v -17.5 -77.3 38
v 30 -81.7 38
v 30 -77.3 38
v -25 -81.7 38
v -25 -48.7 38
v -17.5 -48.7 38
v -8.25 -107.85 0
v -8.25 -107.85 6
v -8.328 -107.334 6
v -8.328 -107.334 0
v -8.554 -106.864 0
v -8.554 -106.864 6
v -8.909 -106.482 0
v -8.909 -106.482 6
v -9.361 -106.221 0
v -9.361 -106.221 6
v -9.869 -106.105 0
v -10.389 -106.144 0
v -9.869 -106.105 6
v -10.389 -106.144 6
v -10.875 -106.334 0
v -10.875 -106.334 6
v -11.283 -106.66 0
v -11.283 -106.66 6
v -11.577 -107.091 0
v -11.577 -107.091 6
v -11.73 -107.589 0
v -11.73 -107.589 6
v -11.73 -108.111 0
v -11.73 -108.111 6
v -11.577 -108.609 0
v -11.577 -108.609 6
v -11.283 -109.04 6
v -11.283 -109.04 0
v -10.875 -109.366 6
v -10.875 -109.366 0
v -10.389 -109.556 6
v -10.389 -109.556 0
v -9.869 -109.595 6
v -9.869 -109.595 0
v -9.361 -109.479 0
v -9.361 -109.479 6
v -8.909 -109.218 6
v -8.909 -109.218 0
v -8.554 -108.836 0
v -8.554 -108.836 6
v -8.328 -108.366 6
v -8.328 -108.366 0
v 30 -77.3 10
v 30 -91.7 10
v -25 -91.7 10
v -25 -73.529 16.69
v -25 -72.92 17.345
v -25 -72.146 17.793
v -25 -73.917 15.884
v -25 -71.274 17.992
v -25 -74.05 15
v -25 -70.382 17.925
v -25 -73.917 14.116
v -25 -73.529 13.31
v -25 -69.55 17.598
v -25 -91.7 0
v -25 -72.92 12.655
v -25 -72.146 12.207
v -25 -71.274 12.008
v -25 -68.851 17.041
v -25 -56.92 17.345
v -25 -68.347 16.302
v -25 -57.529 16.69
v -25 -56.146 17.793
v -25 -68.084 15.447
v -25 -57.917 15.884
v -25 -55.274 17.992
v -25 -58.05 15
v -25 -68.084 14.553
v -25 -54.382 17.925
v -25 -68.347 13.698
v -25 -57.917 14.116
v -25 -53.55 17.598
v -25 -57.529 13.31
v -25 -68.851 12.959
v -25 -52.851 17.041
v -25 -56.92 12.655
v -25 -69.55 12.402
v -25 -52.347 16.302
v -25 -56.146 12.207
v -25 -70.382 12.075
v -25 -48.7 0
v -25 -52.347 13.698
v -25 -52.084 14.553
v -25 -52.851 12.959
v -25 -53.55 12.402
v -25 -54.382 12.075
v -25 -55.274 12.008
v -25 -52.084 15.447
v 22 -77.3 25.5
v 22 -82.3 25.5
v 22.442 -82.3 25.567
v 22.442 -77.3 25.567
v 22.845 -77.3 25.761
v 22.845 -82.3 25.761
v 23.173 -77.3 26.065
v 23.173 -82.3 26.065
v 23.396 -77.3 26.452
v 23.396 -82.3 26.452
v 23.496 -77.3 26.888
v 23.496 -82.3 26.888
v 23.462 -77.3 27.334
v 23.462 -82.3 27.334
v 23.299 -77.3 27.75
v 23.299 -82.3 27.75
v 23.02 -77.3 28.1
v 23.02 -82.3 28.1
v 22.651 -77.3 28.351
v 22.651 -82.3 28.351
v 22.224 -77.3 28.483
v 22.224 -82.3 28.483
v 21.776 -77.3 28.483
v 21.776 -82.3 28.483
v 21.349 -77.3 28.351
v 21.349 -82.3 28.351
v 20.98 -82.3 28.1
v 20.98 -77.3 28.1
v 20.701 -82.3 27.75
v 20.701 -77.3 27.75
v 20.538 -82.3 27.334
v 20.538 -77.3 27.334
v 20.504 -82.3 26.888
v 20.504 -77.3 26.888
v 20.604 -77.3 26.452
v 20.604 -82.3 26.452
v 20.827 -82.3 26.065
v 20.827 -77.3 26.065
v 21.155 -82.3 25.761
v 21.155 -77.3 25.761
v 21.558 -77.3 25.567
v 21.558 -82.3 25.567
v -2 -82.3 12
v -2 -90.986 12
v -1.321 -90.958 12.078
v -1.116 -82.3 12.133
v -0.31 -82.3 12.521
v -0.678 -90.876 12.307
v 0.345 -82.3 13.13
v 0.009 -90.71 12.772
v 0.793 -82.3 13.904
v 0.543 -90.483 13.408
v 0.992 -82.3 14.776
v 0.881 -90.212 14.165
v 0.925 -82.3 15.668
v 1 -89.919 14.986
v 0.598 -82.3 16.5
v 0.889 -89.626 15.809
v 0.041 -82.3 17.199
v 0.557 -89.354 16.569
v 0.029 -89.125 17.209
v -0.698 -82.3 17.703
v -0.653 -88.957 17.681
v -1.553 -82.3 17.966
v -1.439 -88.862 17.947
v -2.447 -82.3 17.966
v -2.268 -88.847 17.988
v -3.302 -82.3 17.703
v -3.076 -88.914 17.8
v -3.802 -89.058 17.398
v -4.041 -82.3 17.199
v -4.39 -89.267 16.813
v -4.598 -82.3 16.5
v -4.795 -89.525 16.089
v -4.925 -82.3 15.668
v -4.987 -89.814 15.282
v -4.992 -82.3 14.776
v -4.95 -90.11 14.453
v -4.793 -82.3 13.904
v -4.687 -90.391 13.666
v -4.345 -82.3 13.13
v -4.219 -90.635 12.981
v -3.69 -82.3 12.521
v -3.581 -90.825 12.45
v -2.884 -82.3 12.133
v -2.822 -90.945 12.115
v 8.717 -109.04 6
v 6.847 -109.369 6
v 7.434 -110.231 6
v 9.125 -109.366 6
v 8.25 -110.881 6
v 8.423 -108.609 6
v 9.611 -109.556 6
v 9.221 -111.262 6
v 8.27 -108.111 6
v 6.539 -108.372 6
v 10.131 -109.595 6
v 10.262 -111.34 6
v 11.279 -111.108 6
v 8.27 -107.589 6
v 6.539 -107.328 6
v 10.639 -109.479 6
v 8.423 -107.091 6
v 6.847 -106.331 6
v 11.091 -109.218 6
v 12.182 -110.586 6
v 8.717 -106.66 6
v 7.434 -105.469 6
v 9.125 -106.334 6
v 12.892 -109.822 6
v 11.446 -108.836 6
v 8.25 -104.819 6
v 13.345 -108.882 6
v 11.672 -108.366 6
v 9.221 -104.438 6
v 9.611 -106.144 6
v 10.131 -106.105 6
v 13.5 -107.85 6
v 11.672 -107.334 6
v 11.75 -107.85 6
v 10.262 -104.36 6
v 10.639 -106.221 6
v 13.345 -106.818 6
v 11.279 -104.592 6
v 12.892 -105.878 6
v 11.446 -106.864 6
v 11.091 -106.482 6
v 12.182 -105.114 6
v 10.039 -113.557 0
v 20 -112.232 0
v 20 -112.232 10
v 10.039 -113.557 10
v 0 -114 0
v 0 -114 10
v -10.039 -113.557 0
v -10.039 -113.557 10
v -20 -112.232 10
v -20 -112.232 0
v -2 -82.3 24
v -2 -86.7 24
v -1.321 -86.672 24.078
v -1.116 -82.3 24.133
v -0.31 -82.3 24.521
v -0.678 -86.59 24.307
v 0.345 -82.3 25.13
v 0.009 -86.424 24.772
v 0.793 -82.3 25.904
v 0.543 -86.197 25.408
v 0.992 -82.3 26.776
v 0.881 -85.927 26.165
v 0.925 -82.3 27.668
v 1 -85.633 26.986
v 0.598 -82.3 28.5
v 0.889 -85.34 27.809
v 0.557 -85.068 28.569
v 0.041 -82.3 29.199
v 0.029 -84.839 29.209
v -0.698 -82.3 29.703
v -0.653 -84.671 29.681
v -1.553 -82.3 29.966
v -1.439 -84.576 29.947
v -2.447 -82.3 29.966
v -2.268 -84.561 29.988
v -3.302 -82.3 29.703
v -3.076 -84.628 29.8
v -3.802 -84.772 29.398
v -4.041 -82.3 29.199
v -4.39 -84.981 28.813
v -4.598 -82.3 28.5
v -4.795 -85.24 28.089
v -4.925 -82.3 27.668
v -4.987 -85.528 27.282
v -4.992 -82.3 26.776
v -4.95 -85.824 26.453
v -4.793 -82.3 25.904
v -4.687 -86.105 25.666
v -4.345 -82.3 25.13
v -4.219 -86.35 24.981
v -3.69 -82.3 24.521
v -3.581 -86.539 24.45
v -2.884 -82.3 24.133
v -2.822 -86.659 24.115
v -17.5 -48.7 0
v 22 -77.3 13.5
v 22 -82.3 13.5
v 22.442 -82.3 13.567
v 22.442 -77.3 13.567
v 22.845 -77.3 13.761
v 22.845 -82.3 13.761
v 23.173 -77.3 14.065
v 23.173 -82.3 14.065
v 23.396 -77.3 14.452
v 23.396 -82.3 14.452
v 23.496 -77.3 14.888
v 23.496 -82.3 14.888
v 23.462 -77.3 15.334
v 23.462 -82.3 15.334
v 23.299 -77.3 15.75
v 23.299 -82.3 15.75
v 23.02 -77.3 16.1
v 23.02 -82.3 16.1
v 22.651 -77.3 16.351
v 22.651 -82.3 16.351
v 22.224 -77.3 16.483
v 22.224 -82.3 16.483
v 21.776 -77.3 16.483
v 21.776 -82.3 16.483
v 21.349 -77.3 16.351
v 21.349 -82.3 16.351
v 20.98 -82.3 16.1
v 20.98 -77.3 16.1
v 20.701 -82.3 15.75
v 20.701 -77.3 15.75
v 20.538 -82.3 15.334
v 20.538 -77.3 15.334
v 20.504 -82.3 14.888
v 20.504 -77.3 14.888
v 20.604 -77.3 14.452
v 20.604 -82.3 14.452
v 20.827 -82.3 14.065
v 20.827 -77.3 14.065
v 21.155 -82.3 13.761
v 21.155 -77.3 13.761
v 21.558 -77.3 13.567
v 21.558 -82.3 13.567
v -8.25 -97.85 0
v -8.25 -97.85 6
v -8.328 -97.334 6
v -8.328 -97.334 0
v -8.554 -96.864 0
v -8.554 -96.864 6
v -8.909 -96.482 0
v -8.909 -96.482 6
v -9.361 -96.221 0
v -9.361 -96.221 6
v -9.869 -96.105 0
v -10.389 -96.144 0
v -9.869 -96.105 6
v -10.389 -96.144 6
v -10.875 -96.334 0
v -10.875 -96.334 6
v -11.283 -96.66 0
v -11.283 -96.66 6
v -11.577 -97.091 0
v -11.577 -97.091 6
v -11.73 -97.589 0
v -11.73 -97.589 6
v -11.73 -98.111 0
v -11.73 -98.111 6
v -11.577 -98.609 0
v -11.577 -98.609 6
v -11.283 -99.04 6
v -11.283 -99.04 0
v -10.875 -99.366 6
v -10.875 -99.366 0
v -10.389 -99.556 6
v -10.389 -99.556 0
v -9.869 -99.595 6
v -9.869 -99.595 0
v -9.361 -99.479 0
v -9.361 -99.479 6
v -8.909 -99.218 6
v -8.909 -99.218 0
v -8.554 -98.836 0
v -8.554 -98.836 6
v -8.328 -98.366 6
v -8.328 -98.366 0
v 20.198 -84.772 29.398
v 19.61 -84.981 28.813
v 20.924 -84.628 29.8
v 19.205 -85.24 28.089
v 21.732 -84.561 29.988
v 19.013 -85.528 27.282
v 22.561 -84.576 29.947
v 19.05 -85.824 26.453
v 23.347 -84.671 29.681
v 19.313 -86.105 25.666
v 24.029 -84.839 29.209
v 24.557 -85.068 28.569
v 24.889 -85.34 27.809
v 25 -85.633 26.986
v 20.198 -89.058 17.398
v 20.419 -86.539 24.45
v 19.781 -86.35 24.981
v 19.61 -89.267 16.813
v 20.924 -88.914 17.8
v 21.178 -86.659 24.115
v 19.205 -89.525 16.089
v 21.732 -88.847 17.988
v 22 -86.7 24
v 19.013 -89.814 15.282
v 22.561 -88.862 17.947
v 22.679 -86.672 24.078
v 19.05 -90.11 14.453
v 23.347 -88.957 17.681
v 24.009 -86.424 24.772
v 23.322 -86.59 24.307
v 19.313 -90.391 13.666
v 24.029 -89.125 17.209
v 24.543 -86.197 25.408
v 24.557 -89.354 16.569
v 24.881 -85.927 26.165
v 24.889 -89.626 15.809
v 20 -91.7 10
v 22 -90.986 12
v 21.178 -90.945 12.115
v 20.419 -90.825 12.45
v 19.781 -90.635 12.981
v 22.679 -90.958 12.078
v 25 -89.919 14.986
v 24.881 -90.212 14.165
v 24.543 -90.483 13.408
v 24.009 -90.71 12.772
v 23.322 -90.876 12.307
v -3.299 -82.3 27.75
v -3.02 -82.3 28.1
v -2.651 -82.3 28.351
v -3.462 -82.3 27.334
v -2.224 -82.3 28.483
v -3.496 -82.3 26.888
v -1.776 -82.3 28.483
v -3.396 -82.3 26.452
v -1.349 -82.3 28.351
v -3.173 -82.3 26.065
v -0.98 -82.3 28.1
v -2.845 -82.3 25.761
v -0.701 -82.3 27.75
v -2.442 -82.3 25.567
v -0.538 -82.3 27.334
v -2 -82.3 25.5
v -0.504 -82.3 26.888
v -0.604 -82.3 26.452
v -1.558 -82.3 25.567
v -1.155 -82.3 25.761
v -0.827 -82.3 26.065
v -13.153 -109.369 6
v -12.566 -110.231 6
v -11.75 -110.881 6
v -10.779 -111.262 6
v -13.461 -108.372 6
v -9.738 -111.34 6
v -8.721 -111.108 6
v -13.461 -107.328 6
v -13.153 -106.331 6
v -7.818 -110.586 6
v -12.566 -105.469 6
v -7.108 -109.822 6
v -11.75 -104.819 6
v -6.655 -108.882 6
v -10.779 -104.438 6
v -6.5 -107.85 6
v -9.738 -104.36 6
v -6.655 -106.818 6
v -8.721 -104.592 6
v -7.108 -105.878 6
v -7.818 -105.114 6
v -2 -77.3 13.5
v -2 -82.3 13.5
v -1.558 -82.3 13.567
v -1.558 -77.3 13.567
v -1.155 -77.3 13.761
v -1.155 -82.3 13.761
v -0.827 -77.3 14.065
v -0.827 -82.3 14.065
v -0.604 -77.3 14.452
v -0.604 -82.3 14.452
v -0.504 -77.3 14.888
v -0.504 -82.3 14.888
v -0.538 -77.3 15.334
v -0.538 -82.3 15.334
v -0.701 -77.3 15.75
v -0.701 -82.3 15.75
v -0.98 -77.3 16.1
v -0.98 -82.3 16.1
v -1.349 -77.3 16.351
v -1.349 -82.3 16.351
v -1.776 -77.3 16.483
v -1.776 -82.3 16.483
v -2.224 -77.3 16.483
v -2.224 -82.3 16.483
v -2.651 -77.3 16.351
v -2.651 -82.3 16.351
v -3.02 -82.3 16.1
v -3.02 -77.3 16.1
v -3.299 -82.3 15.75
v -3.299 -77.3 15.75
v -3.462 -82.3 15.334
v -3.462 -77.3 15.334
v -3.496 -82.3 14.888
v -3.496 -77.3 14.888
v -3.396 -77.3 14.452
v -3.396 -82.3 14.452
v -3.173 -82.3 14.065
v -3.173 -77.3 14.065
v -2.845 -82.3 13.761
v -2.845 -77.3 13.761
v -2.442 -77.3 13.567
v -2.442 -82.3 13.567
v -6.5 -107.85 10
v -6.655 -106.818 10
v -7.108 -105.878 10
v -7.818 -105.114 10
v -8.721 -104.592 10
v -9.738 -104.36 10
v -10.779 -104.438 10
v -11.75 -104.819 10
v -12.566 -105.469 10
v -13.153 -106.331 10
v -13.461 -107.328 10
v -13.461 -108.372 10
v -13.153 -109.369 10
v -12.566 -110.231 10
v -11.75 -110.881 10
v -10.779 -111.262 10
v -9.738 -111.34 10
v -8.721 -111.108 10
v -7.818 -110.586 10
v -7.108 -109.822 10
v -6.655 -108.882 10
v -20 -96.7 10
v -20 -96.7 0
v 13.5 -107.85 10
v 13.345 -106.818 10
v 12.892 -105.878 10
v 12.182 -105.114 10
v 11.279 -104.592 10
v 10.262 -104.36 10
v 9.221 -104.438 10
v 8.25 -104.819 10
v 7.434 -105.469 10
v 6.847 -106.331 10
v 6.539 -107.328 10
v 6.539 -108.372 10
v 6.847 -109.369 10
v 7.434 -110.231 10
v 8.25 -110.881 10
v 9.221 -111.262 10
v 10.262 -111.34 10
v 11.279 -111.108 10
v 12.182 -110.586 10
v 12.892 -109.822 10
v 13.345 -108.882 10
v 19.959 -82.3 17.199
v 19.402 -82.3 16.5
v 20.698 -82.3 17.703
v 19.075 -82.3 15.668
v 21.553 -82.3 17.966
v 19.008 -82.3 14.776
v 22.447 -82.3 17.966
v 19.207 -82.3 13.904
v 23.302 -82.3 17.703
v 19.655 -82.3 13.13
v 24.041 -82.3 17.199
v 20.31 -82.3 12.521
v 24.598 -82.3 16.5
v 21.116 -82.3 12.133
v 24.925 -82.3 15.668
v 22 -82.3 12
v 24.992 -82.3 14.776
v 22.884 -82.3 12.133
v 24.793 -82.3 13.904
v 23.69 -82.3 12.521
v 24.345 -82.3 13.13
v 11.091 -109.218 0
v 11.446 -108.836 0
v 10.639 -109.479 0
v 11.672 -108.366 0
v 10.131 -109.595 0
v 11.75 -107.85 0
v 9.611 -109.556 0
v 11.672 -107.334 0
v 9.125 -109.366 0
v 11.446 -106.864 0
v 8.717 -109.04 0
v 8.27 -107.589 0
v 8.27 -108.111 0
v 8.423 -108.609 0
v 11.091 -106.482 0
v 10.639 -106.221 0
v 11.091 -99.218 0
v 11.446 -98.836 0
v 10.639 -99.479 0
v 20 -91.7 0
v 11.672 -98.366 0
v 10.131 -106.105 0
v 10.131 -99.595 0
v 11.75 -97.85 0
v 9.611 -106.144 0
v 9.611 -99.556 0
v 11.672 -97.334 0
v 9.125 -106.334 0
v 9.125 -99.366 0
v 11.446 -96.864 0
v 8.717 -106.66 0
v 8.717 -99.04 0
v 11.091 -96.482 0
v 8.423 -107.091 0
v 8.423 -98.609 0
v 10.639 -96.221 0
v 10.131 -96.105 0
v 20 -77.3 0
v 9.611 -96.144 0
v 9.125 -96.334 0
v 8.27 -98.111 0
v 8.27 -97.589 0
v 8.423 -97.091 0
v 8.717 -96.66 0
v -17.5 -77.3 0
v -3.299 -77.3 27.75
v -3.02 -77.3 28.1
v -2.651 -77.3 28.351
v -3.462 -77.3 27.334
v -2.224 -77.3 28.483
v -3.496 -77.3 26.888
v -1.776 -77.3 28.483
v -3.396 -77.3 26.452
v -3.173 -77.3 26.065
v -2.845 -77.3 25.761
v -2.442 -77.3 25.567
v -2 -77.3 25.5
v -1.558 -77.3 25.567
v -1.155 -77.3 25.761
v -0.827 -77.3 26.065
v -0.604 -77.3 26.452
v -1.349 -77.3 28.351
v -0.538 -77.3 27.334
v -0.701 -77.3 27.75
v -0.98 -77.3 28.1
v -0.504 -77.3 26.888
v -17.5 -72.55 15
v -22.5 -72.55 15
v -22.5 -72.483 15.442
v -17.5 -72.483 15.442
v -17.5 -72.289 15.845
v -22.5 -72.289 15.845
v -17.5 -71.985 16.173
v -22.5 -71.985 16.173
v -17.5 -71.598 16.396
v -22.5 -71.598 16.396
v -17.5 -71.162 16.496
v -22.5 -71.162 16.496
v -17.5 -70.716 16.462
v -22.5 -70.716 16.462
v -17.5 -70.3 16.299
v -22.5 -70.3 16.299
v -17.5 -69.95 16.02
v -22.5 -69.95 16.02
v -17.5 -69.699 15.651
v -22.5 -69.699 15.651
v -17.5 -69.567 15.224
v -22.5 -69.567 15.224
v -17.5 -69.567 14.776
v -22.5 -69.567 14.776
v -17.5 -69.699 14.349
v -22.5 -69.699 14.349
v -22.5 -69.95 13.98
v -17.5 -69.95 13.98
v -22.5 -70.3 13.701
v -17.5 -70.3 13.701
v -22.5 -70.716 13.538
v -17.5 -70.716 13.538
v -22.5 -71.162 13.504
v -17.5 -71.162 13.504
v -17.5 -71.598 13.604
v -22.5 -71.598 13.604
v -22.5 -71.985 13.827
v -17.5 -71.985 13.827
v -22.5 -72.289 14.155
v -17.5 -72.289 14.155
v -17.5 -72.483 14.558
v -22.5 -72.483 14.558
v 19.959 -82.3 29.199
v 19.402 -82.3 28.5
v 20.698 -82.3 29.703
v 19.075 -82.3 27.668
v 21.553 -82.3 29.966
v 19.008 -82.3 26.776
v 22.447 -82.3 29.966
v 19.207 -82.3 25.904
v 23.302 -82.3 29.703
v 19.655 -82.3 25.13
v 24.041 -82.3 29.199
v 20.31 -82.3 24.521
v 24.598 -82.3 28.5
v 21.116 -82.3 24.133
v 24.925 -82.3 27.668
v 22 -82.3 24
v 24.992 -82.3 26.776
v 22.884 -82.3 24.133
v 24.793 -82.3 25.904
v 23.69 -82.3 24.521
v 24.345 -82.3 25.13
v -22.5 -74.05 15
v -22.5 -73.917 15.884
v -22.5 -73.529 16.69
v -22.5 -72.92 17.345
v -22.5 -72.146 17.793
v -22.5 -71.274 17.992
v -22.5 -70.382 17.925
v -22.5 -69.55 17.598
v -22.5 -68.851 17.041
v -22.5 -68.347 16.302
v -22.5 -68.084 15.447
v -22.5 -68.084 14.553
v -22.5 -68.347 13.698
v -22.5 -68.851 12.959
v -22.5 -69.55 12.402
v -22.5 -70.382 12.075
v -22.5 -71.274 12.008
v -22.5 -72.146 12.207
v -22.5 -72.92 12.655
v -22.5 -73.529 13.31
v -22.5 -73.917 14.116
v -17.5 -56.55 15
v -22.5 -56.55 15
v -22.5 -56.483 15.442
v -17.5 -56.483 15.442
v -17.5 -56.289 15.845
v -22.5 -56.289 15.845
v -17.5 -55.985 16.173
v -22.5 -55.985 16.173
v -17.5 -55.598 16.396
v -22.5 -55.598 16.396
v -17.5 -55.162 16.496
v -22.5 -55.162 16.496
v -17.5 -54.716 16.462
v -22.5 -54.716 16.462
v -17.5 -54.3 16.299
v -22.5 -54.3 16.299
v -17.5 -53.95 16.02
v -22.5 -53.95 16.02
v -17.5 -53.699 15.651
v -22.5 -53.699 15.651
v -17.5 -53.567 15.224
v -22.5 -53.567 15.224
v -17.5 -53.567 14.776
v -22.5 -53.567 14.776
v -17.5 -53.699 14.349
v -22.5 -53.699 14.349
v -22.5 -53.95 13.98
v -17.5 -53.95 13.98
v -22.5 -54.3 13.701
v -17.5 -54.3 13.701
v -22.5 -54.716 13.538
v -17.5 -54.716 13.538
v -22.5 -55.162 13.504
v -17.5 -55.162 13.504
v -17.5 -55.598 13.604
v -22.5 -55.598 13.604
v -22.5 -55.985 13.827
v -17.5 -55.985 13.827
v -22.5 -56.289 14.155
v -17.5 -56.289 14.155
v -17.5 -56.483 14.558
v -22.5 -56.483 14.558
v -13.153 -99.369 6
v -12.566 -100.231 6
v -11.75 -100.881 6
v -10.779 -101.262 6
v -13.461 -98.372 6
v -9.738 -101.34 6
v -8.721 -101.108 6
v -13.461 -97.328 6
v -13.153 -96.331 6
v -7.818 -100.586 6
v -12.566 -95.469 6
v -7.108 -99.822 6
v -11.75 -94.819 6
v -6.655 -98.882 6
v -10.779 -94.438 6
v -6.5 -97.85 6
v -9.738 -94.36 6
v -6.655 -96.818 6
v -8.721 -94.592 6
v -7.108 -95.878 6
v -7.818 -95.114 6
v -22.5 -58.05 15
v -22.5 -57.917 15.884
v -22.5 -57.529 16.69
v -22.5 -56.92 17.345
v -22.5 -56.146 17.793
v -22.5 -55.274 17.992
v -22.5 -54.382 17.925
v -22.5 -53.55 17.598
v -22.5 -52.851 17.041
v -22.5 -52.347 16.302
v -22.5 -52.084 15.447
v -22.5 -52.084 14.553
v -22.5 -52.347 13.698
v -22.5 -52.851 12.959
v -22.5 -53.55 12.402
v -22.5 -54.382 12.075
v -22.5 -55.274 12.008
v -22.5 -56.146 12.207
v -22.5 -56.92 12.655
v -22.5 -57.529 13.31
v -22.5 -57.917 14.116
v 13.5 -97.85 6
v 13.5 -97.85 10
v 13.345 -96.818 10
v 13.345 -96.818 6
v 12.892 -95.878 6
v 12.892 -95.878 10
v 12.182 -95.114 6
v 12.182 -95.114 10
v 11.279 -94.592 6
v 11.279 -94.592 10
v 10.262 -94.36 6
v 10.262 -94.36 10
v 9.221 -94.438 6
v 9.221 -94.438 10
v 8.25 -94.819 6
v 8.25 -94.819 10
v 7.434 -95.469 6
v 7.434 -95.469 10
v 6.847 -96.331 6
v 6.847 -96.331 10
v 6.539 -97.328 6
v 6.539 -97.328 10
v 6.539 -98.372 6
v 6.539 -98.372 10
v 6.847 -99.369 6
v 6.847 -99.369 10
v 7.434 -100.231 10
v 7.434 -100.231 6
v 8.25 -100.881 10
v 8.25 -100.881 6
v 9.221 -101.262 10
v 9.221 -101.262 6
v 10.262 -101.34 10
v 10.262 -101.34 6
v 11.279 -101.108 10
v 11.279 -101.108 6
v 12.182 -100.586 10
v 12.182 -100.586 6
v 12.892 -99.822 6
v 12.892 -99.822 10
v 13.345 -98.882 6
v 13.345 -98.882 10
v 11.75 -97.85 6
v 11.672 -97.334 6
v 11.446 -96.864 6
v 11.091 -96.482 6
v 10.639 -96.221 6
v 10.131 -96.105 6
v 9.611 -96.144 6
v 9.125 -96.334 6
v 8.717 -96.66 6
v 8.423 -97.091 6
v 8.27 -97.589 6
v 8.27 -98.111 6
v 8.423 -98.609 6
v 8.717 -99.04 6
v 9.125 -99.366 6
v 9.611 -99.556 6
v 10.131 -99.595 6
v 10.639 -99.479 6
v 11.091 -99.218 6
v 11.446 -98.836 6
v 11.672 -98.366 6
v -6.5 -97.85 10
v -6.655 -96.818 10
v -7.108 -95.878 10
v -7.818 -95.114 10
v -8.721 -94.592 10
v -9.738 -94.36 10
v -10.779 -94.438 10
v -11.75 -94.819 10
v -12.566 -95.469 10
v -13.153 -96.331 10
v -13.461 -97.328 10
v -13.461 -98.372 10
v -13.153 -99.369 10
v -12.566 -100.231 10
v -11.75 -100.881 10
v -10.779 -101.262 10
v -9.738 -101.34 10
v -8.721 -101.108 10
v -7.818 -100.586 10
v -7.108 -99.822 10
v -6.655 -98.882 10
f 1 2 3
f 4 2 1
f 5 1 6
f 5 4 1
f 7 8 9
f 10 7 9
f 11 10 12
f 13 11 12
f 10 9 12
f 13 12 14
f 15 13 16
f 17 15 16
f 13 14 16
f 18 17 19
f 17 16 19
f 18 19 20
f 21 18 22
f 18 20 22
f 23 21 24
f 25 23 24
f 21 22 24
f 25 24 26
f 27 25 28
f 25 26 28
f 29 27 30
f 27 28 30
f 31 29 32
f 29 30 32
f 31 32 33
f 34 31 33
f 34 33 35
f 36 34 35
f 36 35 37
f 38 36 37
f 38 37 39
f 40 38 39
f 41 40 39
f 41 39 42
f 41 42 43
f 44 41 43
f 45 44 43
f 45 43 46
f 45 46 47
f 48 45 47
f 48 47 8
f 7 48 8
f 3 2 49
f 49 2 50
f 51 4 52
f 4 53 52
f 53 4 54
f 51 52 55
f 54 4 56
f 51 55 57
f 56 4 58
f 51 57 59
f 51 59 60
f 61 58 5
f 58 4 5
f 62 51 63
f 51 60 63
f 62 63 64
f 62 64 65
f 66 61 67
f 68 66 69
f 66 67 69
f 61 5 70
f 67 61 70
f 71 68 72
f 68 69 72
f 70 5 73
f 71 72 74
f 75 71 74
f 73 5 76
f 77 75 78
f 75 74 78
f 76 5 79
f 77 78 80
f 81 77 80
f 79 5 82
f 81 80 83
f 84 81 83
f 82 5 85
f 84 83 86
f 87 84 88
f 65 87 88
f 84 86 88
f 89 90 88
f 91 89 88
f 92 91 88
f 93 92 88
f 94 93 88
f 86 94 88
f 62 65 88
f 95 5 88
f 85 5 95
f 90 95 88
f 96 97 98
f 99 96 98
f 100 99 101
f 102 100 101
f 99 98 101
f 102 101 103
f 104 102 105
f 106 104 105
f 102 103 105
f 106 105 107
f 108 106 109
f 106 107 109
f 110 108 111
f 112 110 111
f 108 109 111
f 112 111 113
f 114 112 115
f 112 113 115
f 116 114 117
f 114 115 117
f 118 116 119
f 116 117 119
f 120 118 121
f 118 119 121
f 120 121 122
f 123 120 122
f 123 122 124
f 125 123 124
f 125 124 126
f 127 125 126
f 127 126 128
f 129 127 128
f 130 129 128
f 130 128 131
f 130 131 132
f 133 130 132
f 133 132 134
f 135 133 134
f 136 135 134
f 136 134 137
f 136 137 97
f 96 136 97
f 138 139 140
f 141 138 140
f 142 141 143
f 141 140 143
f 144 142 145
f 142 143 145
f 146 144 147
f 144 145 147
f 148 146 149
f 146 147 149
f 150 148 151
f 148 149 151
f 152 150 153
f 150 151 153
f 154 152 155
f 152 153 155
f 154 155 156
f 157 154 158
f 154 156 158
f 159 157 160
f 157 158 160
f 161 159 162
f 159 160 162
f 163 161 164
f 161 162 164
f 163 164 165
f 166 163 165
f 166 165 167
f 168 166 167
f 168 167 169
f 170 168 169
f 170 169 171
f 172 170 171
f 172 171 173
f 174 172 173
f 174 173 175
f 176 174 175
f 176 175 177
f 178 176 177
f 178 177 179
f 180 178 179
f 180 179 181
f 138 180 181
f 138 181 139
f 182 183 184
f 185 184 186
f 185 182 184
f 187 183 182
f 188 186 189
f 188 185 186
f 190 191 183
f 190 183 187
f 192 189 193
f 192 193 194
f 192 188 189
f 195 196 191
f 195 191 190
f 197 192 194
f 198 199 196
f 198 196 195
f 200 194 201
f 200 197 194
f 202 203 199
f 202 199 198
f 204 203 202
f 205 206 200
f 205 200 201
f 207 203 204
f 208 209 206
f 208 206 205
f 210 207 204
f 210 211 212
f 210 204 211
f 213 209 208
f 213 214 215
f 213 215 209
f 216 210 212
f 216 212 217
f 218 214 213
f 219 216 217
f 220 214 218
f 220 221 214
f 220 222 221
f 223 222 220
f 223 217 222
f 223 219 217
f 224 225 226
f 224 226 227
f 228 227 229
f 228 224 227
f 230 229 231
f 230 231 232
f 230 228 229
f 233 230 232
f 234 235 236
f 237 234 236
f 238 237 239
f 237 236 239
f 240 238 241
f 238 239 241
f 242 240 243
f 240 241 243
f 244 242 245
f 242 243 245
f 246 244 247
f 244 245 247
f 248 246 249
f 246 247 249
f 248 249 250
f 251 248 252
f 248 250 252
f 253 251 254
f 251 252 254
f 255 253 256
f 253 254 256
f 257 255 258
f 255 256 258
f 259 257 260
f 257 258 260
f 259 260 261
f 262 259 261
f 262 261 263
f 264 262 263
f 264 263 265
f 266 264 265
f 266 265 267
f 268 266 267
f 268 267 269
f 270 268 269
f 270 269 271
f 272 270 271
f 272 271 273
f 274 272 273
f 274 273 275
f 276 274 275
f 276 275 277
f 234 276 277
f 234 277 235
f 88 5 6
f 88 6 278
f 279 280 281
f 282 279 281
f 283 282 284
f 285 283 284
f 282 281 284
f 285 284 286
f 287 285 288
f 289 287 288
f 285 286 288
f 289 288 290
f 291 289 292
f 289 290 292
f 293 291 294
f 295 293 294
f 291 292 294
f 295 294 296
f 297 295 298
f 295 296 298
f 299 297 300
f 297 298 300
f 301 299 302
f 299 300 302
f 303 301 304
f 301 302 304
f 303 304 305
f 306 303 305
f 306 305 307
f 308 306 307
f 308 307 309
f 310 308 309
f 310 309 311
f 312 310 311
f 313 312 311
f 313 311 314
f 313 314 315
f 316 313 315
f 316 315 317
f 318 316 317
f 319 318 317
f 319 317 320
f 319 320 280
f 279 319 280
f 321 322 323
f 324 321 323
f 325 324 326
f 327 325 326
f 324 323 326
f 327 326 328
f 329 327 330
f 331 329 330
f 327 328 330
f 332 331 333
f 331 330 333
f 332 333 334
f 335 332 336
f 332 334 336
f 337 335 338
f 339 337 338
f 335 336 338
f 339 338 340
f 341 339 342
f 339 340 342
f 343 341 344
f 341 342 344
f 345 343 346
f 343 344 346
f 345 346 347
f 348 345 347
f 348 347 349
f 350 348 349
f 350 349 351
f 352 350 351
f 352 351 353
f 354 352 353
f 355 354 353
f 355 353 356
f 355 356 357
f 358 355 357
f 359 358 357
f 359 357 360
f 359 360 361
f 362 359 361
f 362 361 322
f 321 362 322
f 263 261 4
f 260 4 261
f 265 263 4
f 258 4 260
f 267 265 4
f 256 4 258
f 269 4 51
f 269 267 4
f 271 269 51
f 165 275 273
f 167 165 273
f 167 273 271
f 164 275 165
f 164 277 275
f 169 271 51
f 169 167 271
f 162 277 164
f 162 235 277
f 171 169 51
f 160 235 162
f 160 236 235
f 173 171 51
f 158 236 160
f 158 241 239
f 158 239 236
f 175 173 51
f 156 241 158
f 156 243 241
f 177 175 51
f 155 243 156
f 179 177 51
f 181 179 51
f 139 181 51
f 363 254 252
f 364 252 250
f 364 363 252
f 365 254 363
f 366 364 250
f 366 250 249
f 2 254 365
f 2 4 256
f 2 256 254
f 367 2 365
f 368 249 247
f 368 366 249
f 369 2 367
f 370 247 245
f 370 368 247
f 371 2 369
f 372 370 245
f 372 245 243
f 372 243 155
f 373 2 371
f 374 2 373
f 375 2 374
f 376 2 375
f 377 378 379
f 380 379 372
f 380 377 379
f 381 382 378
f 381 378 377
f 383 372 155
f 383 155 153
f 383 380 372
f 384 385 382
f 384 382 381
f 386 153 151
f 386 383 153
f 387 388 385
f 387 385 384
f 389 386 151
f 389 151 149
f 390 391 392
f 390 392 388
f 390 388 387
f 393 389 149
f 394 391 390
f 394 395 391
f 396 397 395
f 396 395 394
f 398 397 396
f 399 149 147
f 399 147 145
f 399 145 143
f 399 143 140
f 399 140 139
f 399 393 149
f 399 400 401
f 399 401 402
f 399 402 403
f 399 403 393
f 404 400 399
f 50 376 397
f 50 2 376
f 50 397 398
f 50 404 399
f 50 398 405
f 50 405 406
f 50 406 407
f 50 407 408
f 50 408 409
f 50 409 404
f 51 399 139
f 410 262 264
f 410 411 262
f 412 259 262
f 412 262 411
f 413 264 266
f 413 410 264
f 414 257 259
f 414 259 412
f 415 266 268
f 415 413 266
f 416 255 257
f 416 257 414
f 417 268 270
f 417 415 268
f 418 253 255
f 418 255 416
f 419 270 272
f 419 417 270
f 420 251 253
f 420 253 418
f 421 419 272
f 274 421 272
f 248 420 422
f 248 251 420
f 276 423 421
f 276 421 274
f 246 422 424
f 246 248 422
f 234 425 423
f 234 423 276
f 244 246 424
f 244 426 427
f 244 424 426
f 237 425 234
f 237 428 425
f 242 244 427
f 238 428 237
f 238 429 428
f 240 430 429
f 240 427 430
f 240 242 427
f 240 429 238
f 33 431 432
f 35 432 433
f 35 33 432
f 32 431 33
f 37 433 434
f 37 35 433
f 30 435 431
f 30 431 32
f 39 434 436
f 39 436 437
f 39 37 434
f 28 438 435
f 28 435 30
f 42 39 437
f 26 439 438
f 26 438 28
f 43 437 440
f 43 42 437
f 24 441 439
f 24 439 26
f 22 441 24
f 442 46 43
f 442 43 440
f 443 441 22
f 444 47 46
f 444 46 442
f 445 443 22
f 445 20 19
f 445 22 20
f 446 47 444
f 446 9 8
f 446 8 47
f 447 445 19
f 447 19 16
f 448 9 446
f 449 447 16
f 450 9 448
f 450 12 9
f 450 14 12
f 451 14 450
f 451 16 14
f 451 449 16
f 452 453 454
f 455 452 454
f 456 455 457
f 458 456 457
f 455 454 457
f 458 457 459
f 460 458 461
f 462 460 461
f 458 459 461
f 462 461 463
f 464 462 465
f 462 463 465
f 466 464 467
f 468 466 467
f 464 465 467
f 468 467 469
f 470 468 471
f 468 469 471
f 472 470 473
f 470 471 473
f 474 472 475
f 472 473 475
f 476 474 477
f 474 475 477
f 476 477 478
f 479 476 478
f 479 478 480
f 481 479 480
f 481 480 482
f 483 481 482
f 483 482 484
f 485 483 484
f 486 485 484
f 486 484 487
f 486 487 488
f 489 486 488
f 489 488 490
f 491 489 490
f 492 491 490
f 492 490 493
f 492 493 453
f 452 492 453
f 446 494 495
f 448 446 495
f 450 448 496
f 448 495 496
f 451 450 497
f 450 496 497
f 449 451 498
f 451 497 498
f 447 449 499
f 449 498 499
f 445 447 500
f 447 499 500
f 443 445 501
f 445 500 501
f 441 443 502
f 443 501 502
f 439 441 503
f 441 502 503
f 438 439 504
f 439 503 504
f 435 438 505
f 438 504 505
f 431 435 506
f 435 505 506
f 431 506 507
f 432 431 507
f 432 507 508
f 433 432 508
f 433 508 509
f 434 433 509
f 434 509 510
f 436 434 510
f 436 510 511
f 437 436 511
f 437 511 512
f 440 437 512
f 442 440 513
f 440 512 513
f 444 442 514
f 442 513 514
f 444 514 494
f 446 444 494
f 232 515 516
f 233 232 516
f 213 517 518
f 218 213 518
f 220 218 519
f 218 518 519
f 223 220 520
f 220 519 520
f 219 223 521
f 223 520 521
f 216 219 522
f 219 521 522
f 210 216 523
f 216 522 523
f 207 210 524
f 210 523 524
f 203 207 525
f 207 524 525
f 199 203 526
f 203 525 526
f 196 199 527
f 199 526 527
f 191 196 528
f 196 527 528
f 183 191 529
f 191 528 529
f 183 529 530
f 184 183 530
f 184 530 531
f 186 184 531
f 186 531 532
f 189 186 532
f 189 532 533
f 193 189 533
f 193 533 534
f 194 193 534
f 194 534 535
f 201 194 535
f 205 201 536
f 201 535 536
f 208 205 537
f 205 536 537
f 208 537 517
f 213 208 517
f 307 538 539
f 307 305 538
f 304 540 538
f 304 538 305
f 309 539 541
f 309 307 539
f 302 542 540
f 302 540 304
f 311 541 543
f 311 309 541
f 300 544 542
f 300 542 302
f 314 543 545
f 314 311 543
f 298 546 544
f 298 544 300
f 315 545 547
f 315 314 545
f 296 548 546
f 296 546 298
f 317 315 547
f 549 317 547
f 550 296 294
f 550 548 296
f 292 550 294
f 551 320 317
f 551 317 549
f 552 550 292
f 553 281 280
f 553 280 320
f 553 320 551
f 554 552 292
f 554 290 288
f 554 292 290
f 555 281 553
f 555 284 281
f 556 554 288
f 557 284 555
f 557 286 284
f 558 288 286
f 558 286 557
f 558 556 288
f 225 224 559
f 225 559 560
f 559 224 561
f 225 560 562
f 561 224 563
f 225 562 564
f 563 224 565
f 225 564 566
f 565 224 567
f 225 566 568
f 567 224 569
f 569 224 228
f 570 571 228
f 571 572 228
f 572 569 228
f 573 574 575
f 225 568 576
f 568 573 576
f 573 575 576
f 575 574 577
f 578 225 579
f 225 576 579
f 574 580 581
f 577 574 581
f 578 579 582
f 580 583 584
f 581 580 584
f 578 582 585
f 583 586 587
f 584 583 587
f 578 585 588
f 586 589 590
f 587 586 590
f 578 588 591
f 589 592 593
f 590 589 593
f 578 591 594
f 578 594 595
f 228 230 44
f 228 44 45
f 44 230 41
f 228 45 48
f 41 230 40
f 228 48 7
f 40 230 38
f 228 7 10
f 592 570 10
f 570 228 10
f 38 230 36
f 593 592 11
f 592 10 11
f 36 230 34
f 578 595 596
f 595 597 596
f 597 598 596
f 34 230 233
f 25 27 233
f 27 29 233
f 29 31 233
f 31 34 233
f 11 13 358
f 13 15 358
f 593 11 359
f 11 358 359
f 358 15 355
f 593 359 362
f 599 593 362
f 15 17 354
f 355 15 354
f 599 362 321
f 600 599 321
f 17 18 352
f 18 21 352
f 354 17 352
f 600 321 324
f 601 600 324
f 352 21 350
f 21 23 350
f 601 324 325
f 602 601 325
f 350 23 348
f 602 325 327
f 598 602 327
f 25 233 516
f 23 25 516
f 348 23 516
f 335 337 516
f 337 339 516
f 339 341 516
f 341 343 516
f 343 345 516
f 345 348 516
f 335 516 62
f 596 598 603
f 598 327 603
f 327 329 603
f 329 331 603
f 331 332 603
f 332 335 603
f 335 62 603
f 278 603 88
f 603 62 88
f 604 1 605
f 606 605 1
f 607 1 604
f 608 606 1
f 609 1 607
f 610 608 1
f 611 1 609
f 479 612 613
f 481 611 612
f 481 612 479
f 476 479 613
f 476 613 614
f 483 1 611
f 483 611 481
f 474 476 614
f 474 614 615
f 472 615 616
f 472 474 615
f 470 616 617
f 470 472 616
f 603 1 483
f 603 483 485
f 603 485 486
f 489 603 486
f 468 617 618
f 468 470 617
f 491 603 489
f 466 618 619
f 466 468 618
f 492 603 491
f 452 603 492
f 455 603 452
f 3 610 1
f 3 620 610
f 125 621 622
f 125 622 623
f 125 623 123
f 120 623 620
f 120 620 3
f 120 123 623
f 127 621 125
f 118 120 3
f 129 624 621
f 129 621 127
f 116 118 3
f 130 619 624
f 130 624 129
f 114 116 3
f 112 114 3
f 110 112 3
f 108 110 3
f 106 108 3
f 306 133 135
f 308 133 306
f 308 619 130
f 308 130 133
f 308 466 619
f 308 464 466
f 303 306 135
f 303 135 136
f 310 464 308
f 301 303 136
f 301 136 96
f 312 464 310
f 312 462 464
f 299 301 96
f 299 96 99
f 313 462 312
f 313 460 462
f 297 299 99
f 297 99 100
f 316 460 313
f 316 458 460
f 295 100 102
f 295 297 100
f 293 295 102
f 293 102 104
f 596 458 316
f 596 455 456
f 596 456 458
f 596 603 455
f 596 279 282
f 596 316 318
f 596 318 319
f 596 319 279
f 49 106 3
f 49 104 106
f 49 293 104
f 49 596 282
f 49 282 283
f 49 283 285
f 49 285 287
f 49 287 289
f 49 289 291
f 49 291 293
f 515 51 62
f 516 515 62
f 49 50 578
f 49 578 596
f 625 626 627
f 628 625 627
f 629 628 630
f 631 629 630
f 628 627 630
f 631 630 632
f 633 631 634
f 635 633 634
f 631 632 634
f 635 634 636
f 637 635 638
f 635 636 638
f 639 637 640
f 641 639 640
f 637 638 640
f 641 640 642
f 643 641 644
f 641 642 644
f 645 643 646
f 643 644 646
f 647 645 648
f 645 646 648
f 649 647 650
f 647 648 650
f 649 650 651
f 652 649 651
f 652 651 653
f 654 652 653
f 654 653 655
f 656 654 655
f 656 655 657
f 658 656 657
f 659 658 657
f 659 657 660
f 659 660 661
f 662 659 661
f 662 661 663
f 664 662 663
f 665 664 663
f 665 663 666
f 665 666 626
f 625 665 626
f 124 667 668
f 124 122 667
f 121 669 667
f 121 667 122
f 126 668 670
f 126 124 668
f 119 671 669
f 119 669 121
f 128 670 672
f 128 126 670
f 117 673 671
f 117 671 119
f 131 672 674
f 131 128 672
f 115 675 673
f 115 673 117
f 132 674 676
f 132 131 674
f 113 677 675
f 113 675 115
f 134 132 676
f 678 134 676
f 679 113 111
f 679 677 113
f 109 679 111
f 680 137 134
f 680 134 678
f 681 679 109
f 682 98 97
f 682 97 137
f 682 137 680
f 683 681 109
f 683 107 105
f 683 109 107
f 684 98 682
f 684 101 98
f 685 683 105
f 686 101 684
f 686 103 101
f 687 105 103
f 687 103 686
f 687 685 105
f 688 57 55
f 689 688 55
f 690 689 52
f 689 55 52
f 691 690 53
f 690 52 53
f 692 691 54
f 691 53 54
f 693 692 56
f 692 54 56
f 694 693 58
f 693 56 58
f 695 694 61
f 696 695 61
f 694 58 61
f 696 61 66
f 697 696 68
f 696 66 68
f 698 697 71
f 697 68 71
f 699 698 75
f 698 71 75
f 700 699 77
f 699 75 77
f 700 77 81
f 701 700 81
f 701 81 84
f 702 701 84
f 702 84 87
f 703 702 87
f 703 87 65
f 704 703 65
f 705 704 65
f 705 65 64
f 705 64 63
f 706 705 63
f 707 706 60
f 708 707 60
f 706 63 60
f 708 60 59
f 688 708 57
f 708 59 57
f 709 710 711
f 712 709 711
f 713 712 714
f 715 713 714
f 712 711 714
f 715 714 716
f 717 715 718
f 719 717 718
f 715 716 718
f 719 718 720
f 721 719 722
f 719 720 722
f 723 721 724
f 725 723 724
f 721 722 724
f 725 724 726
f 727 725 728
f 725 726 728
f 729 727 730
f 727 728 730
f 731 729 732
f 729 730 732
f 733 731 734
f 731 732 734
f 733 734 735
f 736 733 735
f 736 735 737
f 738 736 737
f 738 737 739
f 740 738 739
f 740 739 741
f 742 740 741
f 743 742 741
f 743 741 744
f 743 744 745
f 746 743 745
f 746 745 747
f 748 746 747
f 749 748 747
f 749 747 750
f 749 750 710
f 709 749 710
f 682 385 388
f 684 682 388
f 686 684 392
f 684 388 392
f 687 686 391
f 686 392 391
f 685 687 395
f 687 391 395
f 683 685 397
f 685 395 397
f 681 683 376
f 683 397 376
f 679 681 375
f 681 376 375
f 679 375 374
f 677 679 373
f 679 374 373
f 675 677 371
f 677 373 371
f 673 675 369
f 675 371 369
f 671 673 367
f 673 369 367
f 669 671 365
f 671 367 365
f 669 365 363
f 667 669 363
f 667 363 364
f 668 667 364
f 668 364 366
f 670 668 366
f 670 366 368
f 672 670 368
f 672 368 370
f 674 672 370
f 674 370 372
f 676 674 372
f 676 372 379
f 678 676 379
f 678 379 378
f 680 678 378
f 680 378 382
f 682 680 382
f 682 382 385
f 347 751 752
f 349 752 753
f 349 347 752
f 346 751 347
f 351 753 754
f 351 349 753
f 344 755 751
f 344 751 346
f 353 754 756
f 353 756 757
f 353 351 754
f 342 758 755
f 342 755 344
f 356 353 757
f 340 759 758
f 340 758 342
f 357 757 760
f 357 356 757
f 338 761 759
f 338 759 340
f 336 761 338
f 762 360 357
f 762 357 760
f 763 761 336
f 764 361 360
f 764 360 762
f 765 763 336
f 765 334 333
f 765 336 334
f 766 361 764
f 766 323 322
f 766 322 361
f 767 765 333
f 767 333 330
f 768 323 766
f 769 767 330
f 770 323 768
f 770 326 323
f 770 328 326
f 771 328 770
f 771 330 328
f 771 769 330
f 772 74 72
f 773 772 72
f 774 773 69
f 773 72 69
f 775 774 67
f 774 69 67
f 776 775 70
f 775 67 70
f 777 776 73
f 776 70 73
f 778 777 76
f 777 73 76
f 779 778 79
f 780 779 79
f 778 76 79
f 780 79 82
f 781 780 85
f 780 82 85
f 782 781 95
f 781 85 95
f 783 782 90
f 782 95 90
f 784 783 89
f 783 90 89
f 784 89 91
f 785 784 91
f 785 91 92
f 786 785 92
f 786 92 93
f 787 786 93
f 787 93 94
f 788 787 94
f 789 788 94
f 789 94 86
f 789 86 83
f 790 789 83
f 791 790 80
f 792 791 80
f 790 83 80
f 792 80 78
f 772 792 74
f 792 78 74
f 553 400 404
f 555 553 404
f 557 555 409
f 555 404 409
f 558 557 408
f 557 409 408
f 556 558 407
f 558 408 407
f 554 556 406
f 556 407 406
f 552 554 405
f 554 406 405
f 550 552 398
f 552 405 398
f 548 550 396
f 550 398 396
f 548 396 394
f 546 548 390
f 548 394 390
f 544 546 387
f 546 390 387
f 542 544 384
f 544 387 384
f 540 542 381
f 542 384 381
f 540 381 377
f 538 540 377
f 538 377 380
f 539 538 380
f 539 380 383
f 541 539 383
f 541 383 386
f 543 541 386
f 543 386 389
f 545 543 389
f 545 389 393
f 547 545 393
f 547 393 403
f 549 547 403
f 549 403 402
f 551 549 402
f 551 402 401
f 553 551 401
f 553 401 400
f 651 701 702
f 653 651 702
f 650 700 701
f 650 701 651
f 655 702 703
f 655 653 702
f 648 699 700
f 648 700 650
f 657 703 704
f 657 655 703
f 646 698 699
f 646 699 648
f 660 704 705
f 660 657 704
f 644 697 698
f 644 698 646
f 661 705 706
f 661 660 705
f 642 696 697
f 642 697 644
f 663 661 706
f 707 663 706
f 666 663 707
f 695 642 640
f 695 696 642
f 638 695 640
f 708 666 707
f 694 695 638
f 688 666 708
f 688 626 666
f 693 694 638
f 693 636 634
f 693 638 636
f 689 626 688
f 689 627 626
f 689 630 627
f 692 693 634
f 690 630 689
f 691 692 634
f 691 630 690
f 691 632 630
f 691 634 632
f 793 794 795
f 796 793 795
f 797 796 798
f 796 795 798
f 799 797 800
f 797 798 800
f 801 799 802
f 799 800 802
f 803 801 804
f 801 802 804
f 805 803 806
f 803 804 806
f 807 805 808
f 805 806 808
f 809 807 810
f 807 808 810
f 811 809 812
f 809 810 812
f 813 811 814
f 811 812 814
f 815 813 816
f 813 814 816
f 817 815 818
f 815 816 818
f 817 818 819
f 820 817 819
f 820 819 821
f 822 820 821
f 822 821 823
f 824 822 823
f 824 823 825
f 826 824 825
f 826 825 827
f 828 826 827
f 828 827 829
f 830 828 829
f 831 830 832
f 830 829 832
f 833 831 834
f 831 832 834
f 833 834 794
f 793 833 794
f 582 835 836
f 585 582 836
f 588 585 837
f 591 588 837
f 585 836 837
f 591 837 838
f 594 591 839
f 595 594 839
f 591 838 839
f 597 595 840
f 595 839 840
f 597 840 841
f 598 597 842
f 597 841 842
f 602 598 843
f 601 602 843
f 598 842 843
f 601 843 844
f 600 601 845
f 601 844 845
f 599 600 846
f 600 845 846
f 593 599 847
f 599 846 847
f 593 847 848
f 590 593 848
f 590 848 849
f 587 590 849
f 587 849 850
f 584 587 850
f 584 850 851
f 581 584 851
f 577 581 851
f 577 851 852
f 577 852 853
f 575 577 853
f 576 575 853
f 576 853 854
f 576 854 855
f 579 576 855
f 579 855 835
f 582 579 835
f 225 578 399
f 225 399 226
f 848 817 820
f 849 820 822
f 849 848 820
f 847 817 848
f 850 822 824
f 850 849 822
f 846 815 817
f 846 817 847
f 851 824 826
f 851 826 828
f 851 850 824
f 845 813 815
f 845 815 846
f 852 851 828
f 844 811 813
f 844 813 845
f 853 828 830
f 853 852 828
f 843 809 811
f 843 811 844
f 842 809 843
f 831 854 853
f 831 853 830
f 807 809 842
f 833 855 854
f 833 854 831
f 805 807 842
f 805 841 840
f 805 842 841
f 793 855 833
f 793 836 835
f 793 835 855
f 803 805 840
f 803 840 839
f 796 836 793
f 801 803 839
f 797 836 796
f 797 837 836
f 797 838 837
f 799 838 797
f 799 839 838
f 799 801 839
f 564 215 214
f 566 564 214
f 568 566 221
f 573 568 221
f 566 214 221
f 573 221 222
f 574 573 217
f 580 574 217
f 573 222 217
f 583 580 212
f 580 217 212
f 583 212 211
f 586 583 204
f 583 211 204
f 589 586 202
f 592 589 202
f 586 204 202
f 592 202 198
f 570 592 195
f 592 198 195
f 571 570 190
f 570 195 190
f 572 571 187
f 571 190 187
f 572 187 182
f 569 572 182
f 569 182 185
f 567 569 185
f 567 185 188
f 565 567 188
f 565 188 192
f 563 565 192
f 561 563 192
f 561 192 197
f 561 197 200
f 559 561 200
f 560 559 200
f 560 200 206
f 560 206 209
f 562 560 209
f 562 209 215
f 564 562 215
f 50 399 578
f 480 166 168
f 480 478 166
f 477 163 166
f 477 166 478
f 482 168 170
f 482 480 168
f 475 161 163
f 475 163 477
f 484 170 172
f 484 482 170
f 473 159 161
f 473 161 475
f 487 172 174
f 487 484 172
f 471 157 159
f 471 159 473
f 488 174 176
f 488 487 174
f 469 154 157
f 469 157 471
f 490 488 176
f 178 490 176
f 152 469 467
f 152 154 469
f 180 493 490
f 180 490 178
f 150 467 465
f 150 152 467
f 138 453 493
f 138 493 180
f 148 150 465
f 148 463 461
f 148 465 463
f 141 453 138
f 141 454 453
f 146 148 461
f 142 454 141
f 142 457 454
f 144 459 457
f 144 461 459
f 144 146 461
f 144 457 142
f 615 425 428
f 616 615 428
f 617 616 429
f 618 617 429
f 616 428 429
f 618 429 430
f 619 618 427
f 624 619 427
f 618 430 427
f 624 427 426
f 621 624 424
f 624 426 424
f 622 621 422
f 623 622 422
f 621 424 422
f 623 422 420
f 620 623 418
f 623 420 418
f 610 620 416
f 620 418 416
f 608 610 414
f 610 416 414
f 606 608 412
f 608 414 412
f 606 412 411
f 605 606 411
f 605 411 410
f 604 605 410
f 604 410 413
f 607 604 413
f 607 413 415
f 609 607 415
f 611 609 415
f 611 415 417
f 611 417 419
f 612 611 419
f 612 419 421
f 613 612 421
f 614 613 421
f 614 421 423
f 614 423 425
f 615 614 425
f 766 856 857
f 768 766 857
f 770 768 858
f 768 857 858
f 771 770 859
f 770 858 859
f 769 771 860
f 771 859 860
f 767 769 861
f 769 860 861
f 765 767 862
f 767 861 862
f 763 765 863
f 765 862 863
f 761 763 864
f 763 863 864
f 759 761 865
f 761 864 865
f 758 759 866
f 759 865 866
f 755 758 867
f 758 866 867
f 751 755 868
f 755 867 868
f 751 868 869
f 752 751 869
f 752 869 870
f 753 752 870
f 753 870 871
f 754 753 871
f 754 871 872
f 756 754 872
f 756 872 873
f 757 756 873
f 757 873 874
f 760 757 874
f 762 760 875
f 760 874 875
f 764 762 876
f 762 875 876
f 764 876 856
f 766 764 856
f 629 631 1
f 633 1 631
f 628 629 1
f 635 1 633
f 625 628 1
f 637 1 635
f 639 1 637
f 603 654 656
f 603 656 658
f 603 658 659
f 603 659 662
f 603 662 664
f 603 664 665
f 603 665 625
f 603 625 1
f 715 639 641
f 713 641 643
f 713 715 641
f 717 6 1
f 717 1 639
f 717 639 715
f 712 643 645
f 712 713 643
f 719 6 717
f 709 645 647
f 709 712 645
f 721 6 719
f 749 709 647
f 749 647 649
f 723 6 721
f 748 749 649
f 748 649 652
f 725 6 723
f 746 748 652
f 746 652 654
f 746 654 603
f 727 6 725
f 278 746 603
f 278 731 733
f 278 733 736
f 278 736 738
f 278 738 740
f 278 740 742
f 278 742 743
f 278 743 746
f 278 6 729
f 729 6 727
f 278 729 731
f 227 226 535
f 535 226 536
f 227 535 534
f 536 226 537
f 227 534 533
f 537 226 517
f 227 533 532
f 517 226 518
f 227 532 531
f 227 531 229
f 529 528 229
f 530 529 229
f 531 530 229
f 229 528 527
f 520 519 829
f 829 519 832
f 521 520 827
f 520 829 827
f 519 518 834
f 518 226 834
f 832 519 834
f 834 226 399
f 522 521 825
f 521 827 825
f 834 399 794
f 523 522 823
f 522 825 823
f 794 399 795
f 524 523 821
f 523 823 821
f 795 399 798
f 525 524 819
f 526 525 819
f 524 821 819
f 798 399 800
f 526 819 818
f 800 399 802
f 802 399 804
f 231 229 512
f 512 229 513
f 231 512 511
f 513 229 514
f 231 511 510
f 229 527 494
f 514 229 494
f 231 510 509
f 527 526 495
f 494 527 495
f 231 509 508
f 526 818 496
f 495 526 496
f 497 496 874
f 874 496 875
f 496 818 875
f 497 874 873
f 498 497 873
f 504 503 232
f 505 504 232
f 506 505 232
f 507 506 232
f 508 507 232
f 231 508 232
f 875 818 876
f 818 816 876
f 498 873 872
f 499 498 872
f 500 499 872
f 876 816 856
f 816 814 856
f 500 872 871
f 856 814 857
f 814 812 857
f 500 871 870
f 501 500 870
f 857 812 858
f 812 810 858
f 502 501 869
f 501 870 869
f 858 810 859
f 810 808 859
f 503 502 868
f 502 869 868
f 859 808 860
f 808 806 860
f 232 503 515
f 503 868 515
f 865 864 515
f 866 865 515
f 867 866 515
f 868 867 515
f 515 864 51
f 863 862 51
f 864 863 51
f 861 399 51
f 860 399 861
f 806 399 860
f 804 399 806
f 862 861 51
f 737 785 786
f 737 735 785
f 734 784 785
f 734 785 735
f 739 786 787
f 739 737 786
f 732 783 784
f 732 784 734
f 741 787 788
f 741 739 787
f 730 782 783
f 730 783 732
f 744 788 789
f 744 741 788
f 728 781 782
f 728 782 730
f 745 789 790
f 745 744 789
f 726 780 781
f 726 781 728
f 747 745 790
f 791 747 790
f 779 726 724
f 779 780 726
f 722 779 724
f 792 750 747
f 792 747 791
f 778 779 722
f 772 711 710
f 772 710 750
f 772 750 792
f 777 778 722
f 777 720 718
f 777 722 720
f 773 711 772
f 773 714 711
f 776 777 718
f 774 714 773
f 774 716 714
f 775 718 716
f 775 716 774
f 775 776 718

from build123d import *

# Parameters (mm, degrees)
BOSS_EXTRU_1_DEPTH      = 10
ENL_V_MAT_EXTRU_1_REACH = 118.172
ESQUISSE2_R             = 1.75
ESQUISSE4_R             = 3.5
ENL_V_MAT_EXTRU_2_DEPTH = 4
ESQUISSE5_W             = 50
ESQUISSE5_H             = 38
BOSS_EXTRU_2_DEPTH      = 14.4
ENL_V_MAT_EXTRU_3_REACH = 55.304
ESQUISSE6_R             = 1.5
ESQUISSE7_R             = 3
ENL_V_MAT_EXTRU_4_DEPTH = 9.4
CHANFREIN1_SIZE         = 10
CHANFREIN2_SIZE         = 28
CHANFREIN2_SIZE_2       = 10
BOSS_EXTRU_3_DEPTH      = 5
ESQUISSE9_W             = 38
ESQUISSE9_H             = 28.6
BOSS_EXTRU_4_DEPTH      = 2.5
CHANFREIN3_SIZE         = 5
ENL_V_MAT_EXTRU_5_REACH = 134.155
ESQUISSE10_R            = 1.5
ESQUISSE11_R            = 3
ENL_V_MAT_EXTRU_6_DEPTH = 2.5


# Some blends are built 0.0001 mm under size
with BuildPart() as part:
    # Esquisse1 → Boss.-Extru.1 (new body)
    with BuildSketch(Plane.XY):
        with BuildLine():
            Line((-20, -112.231902773), (-20, -91.7))
            Line((-20, -91.7), (20, -91.7))
            Line((20, -91.7), (20, -112.231902773))
            ThreePointArc((20, -112.231902773), (0, -114), (-20, -112.231902773))
        make_face()
    extrude(amount=BOSS_EXTRU_1_DEPTH)

    # Esquisse2 → Enlèv. mat.-Extru.1 (cut, up to next)
    with BuildSketch(Plane.XY.offset(10), mode=Mode.PRIVATE) as enl_v_mat_extru_1_sk1:
        with Locations((-10, -97.85)):
            Circle(ESQUISSE2_R)
    enl_v_mat_extru_1_tool1 = extrude(enl_v_mat_extru_1_sk1.sketch, amount=-ENL_V_MAT_EXTRU_1_REACH, mode=Mode.PRIVATE) & part.part
    # Esquisse2 → Enlèv. mat.-Extru.1 (cut, up to next)
    with BuildSketch(Plane.XY.offset(10), mode=Mode.PRIVATE) as enl_v_mat_extru_1_sk2:
        with Locations((-10, -107.85)):
            Circle(ESQUISSE2_R)
    enl_v_mat_extru_1_tool2 = extrude(enl_v_mat_extru_1_sk2.sketch, amount=-ENL_V_MAT_EXTRU_1_REACH, mode=Mode.PRIVATE) & part.part
    # Esquisse2 → Enlèv. mat.-Extru.1 (cut, up to next)
    with BuildSketch(Plane.XY.offset(10), mode=Mode.PRIVATE) as enl_v_mat_extru_1_sk3:
        with Locations((10, -97.85)):
            Circle(ESQUISSE2_R)
    enl_v_mat_extru_1_tool3 = extrude(enl_v_mat_extru_1_sk3.sketch, amount=-ENL_V_MAT_EXTRU_1_REACH, mode=Mode.PRIVATE) & part.part
    # Esquisse2 → Enlèv. mat.-Extru.1 (cut, up to next)
    with BuildSketch(Plane.XY.offset(10), mode=Mode.PRIVATE) as enl_v_mat_extru_1_sk4:
        with Locations((10, -107.85)):
            Circle(ESQUISSE2_R)
    enl_v_mat_extru_1_tool4 = extrude(enl_v_mat_extru_1_sk4.sketch, amount=-ENL_V_MAT_EXTRU_1_REACH, mode=Mode.PRIVATE) & part.part
    add(enl_v_mat_extru_1_tool1.solids().sort_by_distance((-10, -97.85, 10))[0], mode=Mode.SUBTRACT)
    add(enl_v_mat_extru_1_tool2.solids().sort_by_distance((-10, -107.85, 10))[0], mode=Mode.SUBTRACT)
    add(enl_v_mat_extru_1_tool3.solids().sort_by_distance((10, -97.85, 10))[0], mode=Mode.SUBTRACT)
    add(enl_v_mat_extru_1_tool4.solids().sort_by_distance((10, -107.85, 10))[0], mode=Mode.SUBTRACT)

    # Esquisse4 → Enlèv. mat.-Extru.2 (cut)
    with BuildSketch(Plane.XY.offset(10)):
        with Locations((-10, -97.85)):
            Circle(ESQUISSE4_R)
        with Locations((10, -97.85)):
            Circle(ESQUISSE4_R)
        with Locations((10, -107.85)):
            Circle(ESQUISSE4_R)
        with Locations((-10, -107.85)):
            Circle(ESQUISSE4_R)
    extrude(amount=-ENL_V_MAT_EXTRU_2_DEPTH, mode=Mode.SUBTRACT)

    # Esquisse5 → Boss.-Extru.2 (add)
    with BuildSketch(Plane(origin=(0, -91.7, 0), x_dir=(1, 0, 0), z_dir=(0, 1, 0))):
        with Locations((5, -19)):
            Rectangle(ESQUISSE5_W, ESQUISSE5_H)
    extrude(amount=BOSS_EXTRU_2_DEPTH)

    # Esquisse6 → Enlèv. mat.-Extru.3 (cut, up to next)
    with BuildSketch(Plane.XZ.offset(91.7), mode=Mode.PRIVATE) as enl_v_mat_extru_3_sk1:
        with Locations(Location((-2, 27, 0), (0, 0, 270))):
            Circle(ESQUISSE6_R)
    enl_v_mat_extru_3_tool1 = extrude(enl_v_mat_extru_3_sk1.sketch, amount=-ENL_V_MAT_EXTRU_3_REACH, mode=Mode.PRIVATE) & part.part
    # Esquisse6 → Enlèv. mat.-Extru.3 (cut, up to next)
    with BuildSketch(Plane.XZ.offset(91.7), mode=Mode.PRIVATE) as enl_v_mat_extru_3_sk2:
        with Locations(Location((22, 27, 0), (0, 0, 270))):
            Circle(ESQUISSE6_R)
    enl_v_mat_extru_3_tool2 = extrude(enl_v_mat_extru_3_sk2.sketch, amount=-ENL_V_MAT_EXTRU_3_REACH, mode=Mode.PRIVATE) & part.part
    # Esquisse6 → Enlèv. mat.-Extru.3 (cut, up to next)
    with BuildSketch(Plane.XZ.offset(91.7), mode=Mode.PRIVATE) as enl_v_mat_extru_3_sk3:
        with Locations(Location((-2, 15, 0), (0, 0, 270))):
            Circle(ESQUISSE6_R)
    enl_v_mat_extru_3_tool3 = extrude(enl_v_mat_extru_3_sk3.sketch, amount=-ENL_V_MAT_EXTRU_3_REACH, mode=Mode.PRIVATE) & part.part
    # Esquisse6 → Enlèv. mat.-Extru.3 (cut, up to next)
    with BuildSketch(Plane.XZ.offset(91.7), mode=Mode.PRIVATE) as enl_v_mat_extru_3_sk4:
        with Locations(Location((22, 15, 0), (0, 0, 270))):
            Circle(ESQUISSE6_R)
    enl_v_mat_extru_3_tool4 = extrude(enl_v_mat_extru_3_sk4.sketch, amount=-ENL_V_MAT_EXTRU_3_REACH, mode=Mode.PRIVATE) & part.part
    add(enl_v_mat_extru_3_tool1.solids().sort_by_distance((-2, -91.7, 27))[0], mode=Mode.SUBTRACT)
    add(enl_v_mat_extru_3_tool2.solids().sort_by_distance((22, -91.7, 27))[0], mode=Mode.SUBTRACT)
    add(enl_v_mat_extru_3_tool3.solids().sort_by_distance((-2, -91.7, 15))[0], mode=Mode.SUBTRACT)
    add(enl_v_mat_extru_3_tool4.solids().sort_by_distance((22, -91.7, 15))[0], mode=Mode.SUBTRACT)

    # Esquisse7 → Enlèv. mat.-Extru.4 (cut)
    with BuildSketch(Plane.XZ.offset(91.7)):
        with Locations(Location((-2, 27, 0), (0, 0, 270))):
            Circle(ESQUISSE7_R)
        with Locations(Location((22, 27, 0), (0, 0, 270))):
            Circle(ESQUISSE7_R)
        with Locations(Location((22, 15, 0), (0, 0, 270))):
            Circle(ESQUISSE7_R)
        with Locations(Location((-2, 15, 0), (0, 0, 270))):
            Circle(ESQUISSE7_R)
    extrude(amount=-ENL_V_MAT_EXTRU_4_DEPTH, mode=Mode.SUBTRACT)

    # Chanfrein1
    chanfrein1_edges = [part.edges().sort_by_distance(p)[0] for p in [
        (30, -84.5, 0),
    ]]
    chamfer(chanfrein1_edges, length=CHANFREIN1_SIZE)

    # Chanfrein2
    # the kernel refuses this chamfer: 28, 10 mm, written as the material it takes off along each edge
    with BuildSketch(Plane(origin=(102.642981969, -91.7, 38), x_dir=(0, -0.01296397650632004, -0.9999159641255577), z_dir=(-1, 0, 0))) as chanfrein2_piece_1:
        Polygon((CHANFREIN2_SIZE * 0.999915964126, -CHANFREIN2_SIZE * 0.0129639765063), (-CHANFREIN2_SIZE_2 * 0.0129639765063, -CHANFREIN2_SIZE_2 * 0.999915964126), (0, 0), align=None)
    extrude(amount=195.285963938, mode=Mode.SUBTRACT)

    # Esquisse8 → Boss.-Extru.3 (add)
    with BuildSketch(Plane.ZY.offset(20)):
        Polygon((10, -91.7), (0, -91.7), (0, -48.7), (38, -48.7), (38, -81.7), align=None)
    extrude(amount=BOSS_EXTRU_3_DEPTH)

    # Esquisse9 → Boss.-Extru.4 (add)
    with BuildSketch(Plane(origin=(-20, 0, 0), x_dir=(0, 0, -1), z_dir=(1, 0, 0))):
        with Locations((-19, -63)):
            Rectangle(ESQUISSE9_W, ESQUISSE9_H)
    extrude(amount=BOSS_EXTRU_4_DEPTH)

    # Chanfrein3
    chanfrein3_edges = [part.edges().sort_by_distance(p)[0] for p in [
        (-20, -91.7, 5),
    ]]
    chamfer(chanfrein3_edges, length=CHANFREIN3_SIZE - 0.0001)  # a hair under: the kernel refuses the full size

    # Esquisse10 → Enlèv. mat.-Extru.5 (cut, up to next)
    with BuildSketch(Plane.ZY.offset(25), mode=Mode.PRIVATE) as enl_v_mat_extru_5_sk1:
        with Locations(Location((15, -55.05, 0), (0, 0, 270))):
            Circle(ESQUISSE10_R)
    enl_v_mat_extru_5_tool1 = extrude(enl_v_mat_extru_5_sk1.sketch, amount=-ENL_V_MAT_EXTRU_5_REACH, mode=Mode.PRIVATE) & part.part
    # Esquisse10 → Enlèv. mat.-Extru.5 (cut, up to next)
    with BuildSketch(Plane.ZY.offset(25), mode=Mode.PRIVATE) as enl_v_mat_extru_5_sk2:
        with Locations(Location((15, -71.05, 0), (0, 0, 270))):
            Circle(ESQUISSE10_R)
    enl_v_mat_extru_5_tool2 = extrude(enl_v_mat_extru_5_sk2.sketch, amount=-ENL_V_MAT_EXTRU_5_REACH, mode=Mode.PRIVATE) & part.part
    add(enl_v_mat_extru_5_tool1.solids().sort_by_distance((-25, -55.05, 15))[0], mode=Mode.SUBTRACT)
    add(enl_v_mat_extru_5_tool2.solids().sort_by_distance((-25, -71.05, 15))[0], mode=Mode.SUBTRACT)

    # Esquisse11 → Enlèv. mat.-Extru.6 (cut)
    with BuildSketch(Plane.ZY.offset(25)):
        with Locations(Location((15, -55.05, 0), (0, 0, 270))):
            Circle(ESQUISSE11_R)
        with Locations(Location((15, -71.05, 0), (0, 0, 270))):
            Circle(ESQUISSE11_R)
    extrude(amount=-ENL_V_MAT_EXTRU_6_DEPTH, mode=Mode.SUBTRACT)


solid = part.part
